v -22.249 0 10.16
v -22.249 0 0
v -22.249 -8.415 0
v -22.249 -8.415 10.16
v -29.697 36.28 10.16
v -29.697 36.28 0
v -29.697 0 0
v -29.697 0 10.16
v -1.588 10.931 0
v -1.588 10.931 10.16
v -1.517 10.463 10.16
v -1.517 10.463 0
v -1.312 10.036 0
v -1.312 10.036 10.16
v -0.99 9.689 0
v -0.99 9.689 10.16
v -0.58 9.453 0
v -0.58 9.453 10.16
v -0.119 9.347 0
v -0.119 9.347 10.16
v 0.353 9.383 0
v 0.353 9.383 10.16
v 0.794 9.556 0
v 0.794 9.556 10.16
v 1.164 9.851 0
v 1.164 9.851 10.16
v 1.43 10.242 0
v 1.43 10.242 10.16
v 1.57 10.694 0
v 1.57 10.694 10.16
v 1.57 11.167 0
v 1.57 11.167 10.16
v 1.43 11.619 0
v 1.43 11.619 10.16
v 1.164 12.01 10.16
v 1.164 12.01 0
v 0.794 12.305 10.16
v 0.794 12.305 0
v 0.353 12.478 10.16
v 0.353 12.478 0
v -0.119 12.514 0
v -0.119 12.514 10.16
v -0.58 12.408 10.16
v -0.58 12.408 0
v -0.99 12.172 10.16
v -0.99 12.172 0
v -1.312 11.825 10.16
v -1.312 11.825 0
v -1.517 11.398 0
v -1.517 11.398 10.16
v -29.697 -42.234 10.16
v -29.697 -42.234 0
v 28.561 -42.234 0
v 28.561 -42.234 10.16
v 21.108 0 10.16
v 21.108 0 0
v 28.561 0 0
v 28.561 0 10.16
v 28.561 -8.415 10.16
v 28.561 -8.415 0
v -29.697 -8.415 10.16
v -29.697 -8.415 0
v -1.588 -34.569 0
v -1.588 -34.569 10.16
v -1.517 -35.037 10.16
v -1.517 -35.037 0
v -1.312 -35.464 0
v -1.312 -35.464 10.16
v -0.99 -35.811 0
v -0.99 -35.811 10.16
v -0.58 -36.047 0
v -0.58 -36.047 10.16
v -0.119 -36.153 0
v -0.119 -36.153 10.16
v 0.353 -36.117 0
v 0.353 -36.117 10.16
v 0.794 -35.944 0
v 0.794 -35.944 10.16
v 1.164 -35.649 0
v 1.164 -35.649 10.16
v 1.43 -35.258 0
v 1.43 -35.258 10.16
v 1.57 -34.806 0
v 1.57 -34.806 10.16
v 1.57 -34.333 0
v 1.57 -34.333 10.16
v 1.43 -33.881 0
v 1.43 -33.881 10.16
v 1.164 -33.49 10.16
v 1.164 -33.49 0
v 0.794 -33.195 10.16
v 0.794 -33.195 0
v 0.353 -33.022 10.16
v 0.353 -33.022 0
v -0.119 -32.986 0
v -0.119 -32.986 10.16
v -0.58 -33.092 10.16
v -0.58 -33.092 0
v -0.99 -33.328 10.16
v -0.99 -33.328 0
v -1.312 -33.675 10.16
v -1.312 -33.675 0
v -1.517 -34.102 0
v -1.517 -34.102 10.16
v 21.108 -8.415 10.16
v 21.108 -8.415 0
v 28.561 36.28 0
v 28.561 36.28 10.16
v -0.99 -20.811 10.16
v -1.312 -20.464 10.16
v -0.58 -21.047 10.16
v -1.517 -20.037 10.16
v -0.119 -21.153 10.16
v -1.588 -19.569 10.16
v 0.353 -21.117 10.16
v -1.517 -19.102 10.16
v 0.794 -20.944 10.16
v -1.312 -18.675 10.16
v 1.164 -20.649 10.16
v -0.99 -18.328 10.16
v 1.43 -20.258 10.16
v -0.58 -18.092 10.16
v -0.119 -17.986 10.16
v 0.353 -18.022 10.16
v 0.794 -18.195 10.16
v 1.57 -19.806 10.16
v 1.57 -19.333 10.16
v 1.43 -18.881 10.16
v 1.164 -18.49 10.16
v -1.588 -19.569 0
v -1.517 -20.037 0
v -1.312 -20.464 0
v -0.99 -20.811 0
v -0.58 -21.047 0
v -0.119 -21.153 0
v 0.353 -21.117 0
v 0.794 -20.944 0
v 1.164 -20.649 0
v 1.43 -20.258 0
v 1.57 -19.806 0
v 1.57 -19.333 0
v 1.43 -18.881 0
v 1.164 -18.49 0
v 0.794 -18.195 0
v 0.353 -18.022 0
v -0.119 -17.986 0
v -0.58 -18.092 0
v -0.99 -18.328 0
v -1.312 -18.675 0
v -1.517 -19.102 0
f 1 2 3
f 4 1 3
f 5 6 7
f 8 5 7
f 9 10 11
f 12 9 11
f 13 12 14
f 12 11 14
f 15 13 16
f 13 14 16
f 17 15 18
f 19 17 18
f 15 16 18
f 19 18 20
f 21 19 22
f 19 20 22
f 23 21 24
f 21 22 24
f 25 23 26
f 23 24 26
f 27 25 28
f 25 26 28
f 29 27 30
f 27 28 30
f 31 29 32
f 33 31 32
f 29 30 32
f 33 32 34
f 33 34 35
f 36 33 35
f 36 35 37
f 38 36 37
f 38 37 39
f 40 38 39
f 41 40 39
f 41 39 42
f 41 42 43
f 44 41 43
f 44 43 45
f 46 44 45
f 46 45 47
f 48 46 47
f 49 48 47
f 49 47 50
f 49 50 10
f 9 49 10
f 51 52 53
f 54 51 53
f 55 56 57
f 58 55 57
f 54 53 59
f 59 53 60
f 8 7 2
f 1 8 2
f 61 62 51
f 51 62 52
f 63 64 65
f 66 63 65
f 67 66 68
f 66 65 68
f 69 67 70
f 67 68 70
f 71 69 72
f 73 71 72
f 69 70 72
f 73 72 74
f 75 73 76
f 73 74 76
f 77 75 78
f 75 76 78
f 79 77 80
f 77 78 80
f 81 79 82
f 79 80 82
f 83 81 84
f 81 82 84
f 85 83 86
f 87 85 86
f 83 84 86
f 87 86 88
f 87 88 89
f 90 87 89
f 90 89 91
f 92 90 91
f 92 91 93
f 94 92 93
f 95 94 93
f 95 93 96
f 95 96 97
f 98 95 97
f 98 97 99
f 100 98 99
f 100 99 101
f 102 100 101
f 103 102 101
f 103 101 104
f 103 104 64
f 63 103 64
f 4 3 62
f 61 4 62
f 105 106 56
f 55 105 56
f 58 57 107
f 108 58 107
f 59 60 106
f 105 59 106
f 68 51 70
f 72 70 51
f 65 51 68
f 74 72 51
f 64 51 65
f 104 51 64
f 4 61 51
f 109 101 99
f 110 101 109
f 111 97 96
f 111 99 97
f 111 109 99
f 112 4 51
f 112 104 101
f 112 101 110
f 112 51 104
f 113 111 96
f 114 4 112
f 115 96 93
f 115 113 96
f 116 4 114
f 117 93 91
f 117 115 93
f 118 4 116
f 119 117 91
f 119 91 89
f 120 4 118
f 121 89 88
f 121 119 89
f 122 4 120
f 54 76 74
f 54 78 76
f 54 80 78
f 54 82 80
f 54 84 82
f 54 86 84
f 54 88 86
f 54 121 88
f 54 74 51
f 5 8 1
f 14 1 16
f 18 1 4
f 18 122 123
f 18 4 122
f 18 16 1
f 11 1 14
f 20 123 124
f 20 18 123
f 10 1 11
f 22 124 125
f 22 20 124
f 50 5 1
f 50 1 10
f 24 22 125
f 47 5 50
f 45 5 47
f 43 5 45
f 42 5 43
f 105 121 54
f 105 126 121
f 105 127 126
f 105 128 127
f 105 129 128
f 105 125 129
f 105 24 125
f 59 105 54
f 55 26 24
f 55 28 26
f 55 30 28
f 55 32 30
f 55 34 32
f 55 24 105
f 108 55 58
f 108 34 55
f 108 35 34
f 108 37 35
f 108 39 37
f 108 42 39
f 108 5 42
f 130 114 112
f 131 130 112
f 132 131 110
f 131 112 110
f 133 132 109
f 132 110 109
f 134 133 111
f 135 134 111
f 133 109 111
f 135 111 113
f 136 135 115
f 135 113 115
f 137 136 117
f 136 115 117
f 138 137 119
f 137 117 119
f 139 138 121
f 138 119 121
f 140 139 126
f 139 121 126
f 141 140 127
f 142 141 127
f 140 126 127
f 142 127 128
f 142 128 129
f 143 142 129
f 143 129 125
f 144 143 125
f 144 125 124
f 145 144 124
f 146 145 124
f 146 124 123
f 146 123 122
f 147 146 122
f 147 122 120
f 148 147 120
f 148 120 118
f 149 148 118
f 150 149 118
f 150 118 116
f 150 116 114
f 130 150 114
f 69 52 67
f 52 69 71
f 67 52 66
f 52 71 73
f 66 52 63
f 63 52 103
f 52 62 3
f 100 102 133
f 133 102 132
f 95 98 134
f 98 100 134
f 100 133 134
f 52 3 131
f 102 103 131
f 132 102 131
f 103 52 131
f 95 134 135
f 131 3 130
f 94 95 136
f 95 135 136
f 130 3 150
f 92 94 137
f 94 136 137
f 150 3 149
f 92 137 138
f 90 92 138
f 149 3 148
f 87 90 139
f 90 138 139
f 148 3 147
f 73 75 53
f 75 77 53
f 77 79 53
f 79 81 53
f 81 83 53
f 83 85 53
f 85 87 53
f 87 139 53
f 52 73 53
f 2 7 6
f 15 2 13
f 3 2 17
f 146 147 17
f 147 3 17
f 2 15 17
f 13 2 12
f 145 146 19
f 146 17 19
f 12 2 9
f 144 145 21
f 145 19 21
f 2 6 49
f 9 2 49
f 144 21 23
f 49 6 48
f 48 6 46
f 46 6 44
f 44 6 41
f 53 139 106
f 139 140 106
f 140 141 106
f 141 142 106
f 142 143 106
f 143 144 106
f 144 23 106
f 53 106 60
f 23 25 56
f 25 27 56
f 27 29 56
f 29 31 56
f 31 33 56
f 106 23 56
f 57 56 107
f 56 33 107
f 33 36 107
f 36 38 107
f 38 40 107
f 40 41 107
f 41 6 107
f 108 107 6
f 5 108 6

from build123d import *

# Parameters (mm, degrees)
F1_DEPTH = 10.16
F2_D     = 3.175
F3_D     = 3.175
F4_D     = 3.175


with BuildPart() as f1:
    # F0 (on Top) → F1 (new body)
    with BuildSketch(Plane.XY):
        Polygon((28.5605379663, 36.279651515), (-29.6971968522, 36.279651515), (-29.6971968522, 0), (-22.248769179, 0), (-22.248769179, -8.4145991132), (-29.6971968522, -8.4145991132), (-29.6971968522, -42.2337416008), (28.5605379663, -42.2337416008), (28.5605379663, -8.4145991132), (21.1078077555, -8.4145991132), (21.1078077555, 0), (28.5605379663, 0), align=None)
    extrude(amount=F1_DEPTH)

    # F2 (through all)
    with Locations(Plane(origin=(0, 0, 0), x_dir=(1, 0, 0), z_dir=(0, 0, -1))):
        with Locations((0, -10.9305603428)):
            Hole(F2_D / 2)

    # F3 (through all)
    with Locations(Plane(origin=(0, 0, 0), x_dir=(1, 0, 0), z_dir=(0, 0, -1))):
        with Locations((0, 19.5694396572)):
            Hole(F3_D / 2)

    # F4 (through all)
    with Locations(Plane(origin=(0, 0, 0), x_dir=(1, 0, 0), z_dir=(0, 0, -1))):
        with Locations((0, 34.5694396572)):
            Hole(F4_D / 2)


solid = f1.part
